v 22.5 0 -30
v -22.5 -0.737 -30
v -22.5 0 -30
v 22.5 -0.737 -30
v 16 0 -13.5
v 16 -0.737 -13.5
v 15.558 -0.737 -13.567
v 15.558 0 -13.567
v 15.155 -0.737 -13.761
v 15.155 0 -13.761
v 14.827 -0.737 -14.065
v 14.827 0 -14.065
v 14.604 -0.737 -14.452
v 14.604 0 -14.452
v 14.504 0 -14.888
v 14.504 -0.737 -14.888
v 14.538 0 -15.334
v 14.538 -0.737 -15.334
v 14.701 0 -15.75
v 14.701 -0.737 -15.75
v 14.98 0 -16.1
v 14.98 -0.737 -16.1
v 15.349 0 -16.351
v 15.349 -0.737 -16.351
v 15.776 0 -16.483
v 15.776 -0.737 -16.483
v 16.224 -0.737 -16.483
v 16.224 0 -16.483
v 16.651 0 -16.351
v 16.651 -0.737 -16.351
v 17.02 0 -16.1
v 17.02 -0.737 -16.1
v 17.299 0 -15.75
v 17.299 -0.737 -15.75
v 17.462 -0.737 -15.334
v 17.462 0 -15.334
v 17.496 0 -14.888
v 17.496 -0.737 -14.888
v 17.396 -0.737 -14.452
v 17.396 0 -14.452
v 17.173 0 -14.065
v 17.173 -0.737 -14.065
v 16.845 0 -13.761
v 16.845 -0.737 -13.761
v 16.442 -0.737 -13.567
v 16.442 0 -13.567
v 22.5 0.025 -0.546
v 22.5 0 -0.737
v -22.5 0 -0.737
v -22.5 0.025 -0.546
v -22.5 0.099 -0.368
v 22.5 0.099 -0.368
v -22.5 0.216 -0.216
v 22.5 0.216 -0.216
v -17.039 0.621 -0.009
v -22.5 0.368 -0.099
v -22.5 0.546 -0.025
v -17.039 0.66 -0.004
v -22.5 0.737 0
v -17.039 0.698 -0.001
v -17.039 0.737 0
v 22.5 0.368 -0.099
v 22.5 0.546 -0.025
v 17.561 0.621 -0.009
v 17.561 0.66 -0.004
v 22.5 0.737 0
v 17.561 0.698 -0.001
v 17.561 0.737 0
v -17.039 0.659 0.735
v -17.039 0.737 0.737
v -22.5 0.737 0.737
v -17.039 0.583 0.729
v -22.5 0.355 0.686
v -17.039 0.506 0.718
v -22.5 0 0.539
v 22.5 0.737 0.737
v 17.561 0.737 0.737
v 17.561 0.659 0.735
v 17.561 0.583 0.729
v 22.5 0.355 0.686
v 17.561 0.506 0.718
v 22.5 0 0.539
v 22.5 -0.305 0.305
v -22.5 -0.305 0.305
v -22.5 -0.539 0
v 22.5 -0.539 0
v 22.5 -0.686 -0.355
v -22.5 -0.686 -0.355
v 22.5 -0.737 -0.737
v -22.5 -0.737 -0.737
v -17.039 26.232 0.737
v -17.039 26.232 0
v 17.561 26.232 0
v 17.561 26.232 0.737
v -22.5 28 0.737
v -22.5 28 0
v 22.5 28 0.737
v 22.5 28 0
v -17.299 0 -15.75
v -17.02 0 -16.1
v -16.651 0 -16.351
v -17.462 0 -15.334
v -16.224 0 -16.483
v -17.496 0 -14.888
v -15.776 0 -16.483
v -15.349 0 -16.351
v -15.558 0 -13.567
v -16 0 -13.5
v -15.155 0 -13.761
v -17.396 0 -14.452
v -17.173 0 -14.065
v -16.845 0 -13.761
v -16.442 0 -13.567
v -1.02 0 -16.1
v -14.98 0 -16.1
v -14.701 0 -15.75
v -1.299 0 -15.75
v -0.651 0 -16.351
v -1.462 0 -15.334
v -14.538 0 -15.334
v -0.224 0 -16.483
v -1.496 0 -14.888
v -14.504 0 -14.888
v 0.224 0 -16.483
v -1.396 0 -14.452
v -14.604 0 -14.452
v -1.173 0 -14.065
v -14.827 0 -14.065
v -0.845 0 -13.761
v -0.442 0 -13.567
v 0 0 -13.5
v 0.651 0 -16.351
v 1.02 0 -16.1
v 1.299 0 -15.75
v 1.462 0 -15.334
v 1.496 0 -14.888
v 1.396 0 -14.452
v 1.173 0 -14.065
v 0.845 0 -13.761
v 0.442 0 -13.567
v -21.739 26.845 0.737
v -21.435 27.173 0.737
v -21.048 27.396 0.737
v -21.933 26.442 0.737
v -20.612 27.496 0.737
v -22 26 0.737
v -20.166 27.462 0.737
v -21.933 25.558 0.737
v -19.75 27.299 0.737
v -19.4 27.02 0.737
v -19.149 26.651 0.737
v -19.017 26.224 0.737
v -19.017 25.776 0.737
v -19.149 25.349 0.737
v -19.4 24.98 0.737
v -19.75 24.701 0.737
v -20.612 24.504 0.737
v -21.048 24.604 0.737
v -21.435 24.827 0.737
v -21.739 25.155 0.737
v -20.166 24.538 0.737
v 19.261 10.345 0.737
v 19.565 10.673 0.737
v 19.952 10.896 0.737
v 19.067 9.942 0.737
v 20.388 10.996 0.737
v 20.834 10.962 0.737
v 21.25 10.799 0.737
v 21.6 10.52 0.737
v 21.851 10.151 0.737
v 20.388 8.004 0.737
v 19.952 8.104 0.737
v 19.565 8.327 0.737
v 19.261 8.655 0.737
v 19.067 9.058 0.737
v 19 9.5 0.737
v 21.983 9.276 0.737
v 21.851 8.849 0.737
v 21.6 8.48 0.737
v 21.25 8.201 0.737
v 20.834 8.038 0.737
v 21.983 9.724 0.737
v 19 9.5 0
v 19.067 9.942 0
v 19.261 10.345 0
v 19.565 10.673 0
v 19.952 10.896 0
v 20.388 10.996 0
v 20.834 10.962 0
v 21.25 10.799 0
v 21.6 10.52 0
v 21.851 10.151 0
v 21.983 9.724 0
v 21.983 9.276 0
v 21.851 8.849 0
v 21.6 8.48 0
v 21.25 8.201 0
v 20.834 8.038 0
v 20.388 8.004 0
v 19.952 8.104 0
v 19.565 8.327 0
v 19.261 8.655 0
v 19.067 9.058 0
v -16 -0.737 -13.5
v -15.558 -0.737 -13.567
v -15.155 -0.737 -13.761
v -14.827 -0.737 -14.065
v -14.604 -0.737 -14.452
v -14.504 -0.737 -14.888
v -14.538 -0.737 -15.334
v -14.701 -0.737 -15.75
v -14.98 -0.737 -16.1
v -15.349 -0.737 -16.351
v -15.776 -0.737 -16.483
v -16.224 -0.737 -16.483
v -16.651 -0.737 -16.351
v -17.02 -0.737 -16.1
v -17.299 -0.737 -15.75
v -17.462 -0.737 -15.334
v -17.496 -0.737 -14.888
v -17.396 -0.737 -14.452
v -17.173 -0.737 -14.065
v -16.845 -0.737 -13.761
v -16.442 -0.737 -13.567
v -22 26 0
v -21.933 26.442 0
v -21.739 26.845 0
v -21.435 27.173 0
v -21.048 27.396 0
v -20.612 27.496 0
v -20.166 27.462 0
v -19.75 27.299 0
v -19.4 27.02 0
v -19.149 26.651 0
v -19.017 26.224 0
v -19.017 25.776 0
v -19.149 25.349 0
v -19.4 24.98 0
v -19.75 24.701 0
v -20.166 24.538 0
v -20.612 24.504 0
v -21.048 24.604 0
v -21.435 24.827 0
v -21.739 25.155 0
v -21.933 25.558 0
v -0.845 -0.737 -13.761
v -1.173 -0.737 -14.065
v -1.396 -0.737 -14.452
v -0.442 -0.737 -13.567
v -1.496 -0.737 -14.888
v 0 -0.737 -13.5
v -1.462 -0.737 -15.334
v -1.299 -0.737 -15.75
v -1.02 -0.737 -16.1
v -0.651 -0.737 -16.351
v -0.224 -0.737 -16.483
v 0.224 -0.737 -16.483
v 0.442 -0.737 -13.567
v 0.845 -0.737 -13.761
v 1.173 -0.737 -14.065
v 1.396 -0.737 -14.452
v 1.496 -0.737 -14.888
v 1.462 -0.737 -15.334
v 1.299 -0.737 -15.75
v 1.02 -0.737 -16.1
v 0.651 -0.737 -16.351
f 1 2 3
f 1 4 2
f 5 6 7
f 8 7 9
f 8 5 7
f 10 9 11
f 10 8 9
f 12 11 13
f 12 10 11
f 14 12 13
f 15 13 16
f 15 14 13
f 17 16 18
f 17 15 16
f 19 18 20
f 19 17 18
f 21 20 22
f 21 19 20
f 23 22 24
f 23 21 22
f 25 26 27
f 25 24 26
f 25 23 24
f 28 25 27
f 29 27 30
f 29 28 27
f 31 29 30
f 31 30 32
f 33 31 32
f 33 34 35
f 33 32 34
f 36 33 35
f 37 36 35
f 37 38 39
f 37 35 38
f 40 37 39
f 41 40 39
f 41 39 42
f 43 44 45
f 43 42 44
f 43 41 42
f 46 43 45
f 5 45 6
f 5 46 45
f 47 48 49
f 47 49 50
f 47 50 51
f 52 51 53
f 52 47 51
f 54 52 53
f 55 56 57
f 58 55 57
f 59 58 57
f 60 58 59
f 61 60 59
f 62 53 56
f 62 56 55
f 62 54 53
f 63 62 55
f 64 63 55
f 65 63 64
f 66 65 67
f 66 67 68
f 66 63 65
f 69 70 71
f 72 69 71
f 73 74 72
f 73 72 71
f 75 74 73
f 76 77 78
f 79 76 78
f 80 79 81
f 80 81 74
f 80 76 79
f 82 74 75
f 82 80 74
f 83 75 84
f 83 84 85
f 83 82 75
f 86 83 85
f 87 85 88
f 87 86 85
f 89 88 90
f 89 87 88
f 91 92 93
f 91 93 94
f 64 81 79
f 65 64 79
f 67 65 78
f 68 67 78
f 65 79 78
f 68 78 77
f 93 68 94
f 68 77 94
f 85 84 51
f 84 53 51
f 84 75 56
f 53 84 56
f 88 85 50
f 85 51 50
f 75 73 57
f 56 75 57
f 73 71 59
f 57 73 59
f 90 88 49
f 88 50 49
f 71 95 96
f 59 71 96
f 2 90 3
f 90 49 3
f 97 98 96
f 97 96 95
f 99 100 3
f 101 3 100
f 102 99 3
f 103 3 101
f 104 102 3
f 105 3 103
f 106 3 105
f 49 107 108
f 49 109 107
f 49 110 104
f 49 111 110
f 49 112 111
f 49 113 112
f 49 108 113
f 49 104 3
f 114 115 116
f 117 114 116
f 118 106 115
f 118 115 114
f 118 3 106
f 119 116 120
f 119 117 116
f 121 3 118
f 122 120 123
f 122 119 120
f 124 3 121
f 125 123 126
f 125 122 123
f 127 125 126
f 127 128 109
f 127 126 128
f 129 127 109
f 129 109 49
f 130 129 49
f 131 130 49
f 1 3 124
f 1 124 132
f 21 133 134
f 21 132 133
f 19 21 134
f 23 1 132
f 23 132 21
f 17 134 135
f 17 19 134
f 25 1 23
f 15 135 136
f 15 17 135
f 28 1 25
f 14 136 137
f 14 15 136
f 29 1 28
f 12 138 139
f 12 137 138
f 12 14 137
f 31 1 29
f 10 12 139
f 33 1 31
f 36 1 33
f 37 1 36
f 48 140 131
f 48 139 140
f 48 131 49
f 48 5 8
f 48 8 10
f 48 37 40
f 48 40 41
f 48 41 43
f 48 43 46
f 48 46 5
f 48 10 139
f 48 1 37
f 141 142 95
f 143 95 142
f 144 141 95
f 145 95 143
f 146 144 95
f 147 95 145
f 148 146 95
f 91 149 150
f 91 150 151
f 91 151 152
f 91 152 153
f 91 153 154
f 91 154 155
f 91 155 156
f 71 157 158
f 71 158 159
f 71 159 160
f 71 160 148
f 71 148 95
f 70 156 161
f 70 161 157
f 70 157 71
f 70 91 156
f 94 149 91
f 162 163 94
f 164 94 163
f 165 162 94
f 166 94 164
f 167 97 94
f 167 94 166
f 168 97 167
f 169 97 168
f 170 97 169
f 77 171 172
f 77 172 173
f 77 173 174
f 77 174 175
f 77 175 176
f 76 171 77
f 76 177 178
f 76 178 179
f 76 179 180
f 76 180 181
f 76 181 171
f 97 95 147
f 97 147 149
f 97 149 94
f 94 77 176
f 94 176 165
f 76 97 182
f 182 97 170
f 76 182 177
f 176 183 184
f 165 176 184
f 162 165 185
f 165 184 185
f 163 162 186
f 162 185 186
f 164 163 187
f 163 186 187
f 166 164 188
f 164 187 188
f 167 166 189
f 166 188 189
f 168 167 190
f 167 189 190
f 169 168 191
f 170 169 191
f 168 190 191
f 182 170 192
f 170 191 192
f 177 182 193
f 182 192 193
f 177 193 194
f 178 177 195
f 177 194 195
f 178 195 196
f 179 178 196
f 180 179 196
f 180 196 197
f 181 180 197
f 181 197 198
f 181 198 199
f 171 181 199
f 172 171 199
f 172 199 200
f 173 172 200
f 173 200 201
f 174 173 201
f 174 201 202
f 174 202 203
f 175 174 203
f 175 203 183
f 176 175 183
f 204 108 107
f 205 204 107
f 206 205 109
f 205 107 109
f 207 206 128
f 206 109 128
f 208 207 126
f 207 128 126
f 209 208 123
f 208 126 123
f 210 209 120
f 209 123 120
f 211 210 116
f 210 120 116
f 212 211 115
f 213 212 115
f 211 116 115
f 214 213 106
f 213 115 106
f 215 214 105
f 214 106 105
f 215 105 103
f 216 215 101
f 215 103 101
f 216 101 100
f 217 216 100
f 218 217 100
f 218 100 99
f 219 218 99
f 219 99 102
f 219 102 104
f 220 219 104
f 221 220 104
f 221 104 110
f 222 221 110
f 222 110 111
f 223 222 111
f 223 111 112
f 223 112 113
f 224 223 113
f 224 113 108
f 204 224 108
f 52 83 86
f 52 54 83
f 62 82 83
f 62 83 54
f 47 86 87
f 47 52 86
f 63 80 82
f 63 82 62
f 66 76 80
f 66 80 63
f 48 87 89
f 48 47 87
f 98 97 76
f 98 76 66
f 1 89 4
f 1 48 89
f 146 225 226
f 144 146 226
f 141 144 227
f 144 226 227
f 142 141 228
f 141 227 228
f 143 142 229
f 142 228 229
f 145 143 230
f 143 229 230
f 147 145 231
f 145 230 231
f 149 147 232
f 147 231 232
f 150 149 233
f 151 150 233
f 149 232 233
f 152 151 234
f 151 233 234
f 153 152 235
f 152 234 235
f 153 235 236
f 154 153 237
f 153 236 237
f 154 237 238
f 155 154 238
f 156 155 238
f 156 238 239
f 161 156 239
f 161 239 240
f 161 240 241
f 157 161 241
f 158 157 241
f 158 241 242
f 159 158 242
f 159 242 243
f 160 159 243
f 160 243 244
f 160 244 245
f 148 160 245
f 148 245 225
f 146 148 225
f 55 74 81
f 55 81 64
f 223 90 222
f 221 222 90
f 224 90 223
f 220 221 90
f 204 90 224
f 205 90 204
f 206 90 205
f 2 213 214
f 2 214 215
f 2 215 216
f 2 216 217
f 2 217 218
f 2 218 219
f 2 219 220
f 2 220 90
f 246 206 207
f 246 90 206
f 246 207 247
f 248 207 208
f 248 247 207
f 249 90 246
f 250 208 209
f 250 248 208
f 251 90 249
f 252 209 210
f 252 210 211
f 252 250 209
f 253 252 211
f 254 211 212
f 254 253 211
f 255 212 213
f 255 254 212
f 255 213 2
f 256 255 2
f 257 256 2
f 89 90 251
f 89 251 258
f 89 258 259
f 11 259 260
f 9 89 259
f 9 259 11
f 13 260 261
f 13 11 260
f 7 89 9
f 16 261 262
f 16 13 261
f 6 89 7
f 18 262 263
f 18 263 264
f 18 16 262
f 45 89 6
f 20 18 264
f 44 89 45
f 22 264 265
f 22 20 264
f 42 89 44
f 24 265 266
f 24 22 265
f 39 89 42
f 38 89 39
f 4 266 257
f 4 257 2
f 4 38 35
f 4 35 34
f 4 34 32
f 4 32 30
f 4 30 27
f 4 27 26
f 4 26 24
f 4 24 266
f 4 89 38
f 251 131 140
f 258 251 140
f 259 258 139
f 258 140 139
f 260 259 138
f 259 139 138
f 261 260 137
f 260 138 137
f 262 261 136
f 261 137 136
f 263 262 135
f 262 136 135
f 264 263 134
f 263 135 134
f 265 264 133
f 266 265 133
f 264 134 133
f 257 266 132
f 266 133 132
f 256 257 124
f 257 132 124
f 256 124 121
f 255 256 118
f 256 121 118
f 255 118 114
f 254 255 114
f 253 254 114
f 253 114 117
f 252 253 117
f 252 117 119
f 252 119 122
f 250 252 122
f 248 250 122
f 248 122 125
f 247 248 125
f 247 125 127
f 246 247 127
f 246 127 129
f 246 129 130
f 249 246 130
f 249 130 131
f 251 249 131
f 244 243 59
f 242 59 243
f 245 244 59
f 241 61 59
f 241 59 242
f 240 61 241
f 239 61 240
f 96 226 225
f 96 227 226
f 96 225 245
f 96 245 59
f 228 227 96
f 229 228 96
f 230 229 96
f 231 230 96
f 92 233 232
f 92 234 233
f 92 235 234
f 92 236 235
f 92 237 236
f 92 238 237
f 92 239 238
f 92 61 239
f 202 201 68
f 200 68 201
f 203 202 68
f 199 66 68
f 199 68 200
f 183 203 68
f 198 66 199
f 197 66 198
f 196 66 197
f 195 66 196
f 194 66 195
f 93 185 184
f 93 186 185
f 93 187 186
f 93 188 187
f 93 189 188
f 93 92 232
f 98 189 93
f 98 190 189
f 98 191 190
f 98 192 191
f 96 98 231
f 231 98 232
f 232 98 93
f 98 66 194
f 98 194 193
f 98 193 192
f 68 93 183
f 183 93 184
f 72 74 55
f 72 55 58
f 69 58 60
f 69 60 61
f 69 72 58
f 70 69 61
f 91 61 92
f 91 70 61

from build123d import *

# Parameters (mm, degrees)
BASE_FLANGE1_DEPTH = 22.5
SKETCH6_R          = 1.5
CUT_EXTRUDE2_DEPTH = 47.800106837
SKETCH8_R          = 1.5
CUT_EXTRUDE3_DEPTH = 47.800106837
CUT_EXTRUDE5_START = -17.038685437
CUT_EXTRUDE5_DEPTH = 34.599471918


# Read off the part's stored shape, not the designer's step: Cut-Extrude5
# Sheet-metal steps are written as plain solids
with BuildPart() as part:
    # Sketch2 → Base-Flange1 (new, symmetric)
    with BuildSketch(Plane(origin=(0, 0, 0), x_dir=(0, 0, -1), z_dir=(1, 0, 0))):
        with BuildLine():
            Line((30, 0), (0.7366, 0))
            ThreePointArc((0.7366, 0), (0.215745145, 0.215745145), (0, 0.7366))
            Line((0, 0.7366), (0, 28))
            Line((0, 28), (-0.7366, 28))
            Line((-0.7366, 28), (-0.7366, 0.7366))
            ThreePointArc((-0.7366, 0.7366), (-0.30510971, -0.30510971), (0.7366, -0.7366))
            Line((0.7366, -0.7366), (30, -0.7366))
            Line((30, -0.7366), (30, 0))
        make_face()
    extrude(amount=BASE_FLANGE1_DEPTH, both=True)

    # Sketch6 → Cut-Extrude2 (cut, through all)
    with BuildSketch(Plane(origin=(0, 0, 0), x_dir=(-1, 0, 0), z_dir=(0, 0, -1))):
        with Locations((-20.5, 9.5)):
            Circle(SKETCH6_R)
        with Locations((20.5, 26)):
            Circle(SKETCH6_R)
    extrude(amount=-CUT_EXTRUDE2_DEPTH, mode=Mode.SUBTRACT)

    # Sketch8 → Cut-Extrude3 (cut, through all)
    with BuildSketch(Plane(origin=(0, 0, 0), x_dir=(1, 0, 0), z_dir=(0, 1, 0))):
        with Locations(Location((0, 15, 0), (0, 0, 270))):
            Circle(SKETCH8_R)
        with Locations(Location((-16, 15, 0), (0, 0, 270))):
            Circle(SKETCH8_R)
    cut_extrude3 = extrude(amount=-CUT_EXTRUDE3_DEPTH, mode=Mode.SUBTRACT)

    # Mirror1: Cut-Extrude3 across plane
    add(cut_extrude3.mirror(Plane(origin=(0, 0, 0), x_dir=(0, 0, 1), z_dir=(1, 0, 0))), mode=Mode.SUBTRACT)

    # Cut-Extrude5 outline → Cut-Extrude5 (cut)
    with BuildSketch(Plane.YZ.offset(CUT_EXTRUDE5_START)):
        with BuildLine():
            ThreePointArc((0.7366, 0.7366), (0.620934378, 0.732052343), (0.505982859, 0.718437448))
            Line((0.505982859, 0.718437448), (0.62129143, -0.009081276))
            ThreePointArc((0.62129143, -0.009081276), (0.678767189, -0.002273829), (0.7366, 0))
            Line((0.7366, 0), (26.231735093, 0))
            Line((26.231735093, 0), (26.231735093, 0.7366))
            Line((26.231735093, 0.7366), (0.7366, 0.7366))
        make_face()
    extrude(amount=CUT_EXTRUDE5_DEPTH, mode=Mode.SUBTRACT)


solid = part.part
